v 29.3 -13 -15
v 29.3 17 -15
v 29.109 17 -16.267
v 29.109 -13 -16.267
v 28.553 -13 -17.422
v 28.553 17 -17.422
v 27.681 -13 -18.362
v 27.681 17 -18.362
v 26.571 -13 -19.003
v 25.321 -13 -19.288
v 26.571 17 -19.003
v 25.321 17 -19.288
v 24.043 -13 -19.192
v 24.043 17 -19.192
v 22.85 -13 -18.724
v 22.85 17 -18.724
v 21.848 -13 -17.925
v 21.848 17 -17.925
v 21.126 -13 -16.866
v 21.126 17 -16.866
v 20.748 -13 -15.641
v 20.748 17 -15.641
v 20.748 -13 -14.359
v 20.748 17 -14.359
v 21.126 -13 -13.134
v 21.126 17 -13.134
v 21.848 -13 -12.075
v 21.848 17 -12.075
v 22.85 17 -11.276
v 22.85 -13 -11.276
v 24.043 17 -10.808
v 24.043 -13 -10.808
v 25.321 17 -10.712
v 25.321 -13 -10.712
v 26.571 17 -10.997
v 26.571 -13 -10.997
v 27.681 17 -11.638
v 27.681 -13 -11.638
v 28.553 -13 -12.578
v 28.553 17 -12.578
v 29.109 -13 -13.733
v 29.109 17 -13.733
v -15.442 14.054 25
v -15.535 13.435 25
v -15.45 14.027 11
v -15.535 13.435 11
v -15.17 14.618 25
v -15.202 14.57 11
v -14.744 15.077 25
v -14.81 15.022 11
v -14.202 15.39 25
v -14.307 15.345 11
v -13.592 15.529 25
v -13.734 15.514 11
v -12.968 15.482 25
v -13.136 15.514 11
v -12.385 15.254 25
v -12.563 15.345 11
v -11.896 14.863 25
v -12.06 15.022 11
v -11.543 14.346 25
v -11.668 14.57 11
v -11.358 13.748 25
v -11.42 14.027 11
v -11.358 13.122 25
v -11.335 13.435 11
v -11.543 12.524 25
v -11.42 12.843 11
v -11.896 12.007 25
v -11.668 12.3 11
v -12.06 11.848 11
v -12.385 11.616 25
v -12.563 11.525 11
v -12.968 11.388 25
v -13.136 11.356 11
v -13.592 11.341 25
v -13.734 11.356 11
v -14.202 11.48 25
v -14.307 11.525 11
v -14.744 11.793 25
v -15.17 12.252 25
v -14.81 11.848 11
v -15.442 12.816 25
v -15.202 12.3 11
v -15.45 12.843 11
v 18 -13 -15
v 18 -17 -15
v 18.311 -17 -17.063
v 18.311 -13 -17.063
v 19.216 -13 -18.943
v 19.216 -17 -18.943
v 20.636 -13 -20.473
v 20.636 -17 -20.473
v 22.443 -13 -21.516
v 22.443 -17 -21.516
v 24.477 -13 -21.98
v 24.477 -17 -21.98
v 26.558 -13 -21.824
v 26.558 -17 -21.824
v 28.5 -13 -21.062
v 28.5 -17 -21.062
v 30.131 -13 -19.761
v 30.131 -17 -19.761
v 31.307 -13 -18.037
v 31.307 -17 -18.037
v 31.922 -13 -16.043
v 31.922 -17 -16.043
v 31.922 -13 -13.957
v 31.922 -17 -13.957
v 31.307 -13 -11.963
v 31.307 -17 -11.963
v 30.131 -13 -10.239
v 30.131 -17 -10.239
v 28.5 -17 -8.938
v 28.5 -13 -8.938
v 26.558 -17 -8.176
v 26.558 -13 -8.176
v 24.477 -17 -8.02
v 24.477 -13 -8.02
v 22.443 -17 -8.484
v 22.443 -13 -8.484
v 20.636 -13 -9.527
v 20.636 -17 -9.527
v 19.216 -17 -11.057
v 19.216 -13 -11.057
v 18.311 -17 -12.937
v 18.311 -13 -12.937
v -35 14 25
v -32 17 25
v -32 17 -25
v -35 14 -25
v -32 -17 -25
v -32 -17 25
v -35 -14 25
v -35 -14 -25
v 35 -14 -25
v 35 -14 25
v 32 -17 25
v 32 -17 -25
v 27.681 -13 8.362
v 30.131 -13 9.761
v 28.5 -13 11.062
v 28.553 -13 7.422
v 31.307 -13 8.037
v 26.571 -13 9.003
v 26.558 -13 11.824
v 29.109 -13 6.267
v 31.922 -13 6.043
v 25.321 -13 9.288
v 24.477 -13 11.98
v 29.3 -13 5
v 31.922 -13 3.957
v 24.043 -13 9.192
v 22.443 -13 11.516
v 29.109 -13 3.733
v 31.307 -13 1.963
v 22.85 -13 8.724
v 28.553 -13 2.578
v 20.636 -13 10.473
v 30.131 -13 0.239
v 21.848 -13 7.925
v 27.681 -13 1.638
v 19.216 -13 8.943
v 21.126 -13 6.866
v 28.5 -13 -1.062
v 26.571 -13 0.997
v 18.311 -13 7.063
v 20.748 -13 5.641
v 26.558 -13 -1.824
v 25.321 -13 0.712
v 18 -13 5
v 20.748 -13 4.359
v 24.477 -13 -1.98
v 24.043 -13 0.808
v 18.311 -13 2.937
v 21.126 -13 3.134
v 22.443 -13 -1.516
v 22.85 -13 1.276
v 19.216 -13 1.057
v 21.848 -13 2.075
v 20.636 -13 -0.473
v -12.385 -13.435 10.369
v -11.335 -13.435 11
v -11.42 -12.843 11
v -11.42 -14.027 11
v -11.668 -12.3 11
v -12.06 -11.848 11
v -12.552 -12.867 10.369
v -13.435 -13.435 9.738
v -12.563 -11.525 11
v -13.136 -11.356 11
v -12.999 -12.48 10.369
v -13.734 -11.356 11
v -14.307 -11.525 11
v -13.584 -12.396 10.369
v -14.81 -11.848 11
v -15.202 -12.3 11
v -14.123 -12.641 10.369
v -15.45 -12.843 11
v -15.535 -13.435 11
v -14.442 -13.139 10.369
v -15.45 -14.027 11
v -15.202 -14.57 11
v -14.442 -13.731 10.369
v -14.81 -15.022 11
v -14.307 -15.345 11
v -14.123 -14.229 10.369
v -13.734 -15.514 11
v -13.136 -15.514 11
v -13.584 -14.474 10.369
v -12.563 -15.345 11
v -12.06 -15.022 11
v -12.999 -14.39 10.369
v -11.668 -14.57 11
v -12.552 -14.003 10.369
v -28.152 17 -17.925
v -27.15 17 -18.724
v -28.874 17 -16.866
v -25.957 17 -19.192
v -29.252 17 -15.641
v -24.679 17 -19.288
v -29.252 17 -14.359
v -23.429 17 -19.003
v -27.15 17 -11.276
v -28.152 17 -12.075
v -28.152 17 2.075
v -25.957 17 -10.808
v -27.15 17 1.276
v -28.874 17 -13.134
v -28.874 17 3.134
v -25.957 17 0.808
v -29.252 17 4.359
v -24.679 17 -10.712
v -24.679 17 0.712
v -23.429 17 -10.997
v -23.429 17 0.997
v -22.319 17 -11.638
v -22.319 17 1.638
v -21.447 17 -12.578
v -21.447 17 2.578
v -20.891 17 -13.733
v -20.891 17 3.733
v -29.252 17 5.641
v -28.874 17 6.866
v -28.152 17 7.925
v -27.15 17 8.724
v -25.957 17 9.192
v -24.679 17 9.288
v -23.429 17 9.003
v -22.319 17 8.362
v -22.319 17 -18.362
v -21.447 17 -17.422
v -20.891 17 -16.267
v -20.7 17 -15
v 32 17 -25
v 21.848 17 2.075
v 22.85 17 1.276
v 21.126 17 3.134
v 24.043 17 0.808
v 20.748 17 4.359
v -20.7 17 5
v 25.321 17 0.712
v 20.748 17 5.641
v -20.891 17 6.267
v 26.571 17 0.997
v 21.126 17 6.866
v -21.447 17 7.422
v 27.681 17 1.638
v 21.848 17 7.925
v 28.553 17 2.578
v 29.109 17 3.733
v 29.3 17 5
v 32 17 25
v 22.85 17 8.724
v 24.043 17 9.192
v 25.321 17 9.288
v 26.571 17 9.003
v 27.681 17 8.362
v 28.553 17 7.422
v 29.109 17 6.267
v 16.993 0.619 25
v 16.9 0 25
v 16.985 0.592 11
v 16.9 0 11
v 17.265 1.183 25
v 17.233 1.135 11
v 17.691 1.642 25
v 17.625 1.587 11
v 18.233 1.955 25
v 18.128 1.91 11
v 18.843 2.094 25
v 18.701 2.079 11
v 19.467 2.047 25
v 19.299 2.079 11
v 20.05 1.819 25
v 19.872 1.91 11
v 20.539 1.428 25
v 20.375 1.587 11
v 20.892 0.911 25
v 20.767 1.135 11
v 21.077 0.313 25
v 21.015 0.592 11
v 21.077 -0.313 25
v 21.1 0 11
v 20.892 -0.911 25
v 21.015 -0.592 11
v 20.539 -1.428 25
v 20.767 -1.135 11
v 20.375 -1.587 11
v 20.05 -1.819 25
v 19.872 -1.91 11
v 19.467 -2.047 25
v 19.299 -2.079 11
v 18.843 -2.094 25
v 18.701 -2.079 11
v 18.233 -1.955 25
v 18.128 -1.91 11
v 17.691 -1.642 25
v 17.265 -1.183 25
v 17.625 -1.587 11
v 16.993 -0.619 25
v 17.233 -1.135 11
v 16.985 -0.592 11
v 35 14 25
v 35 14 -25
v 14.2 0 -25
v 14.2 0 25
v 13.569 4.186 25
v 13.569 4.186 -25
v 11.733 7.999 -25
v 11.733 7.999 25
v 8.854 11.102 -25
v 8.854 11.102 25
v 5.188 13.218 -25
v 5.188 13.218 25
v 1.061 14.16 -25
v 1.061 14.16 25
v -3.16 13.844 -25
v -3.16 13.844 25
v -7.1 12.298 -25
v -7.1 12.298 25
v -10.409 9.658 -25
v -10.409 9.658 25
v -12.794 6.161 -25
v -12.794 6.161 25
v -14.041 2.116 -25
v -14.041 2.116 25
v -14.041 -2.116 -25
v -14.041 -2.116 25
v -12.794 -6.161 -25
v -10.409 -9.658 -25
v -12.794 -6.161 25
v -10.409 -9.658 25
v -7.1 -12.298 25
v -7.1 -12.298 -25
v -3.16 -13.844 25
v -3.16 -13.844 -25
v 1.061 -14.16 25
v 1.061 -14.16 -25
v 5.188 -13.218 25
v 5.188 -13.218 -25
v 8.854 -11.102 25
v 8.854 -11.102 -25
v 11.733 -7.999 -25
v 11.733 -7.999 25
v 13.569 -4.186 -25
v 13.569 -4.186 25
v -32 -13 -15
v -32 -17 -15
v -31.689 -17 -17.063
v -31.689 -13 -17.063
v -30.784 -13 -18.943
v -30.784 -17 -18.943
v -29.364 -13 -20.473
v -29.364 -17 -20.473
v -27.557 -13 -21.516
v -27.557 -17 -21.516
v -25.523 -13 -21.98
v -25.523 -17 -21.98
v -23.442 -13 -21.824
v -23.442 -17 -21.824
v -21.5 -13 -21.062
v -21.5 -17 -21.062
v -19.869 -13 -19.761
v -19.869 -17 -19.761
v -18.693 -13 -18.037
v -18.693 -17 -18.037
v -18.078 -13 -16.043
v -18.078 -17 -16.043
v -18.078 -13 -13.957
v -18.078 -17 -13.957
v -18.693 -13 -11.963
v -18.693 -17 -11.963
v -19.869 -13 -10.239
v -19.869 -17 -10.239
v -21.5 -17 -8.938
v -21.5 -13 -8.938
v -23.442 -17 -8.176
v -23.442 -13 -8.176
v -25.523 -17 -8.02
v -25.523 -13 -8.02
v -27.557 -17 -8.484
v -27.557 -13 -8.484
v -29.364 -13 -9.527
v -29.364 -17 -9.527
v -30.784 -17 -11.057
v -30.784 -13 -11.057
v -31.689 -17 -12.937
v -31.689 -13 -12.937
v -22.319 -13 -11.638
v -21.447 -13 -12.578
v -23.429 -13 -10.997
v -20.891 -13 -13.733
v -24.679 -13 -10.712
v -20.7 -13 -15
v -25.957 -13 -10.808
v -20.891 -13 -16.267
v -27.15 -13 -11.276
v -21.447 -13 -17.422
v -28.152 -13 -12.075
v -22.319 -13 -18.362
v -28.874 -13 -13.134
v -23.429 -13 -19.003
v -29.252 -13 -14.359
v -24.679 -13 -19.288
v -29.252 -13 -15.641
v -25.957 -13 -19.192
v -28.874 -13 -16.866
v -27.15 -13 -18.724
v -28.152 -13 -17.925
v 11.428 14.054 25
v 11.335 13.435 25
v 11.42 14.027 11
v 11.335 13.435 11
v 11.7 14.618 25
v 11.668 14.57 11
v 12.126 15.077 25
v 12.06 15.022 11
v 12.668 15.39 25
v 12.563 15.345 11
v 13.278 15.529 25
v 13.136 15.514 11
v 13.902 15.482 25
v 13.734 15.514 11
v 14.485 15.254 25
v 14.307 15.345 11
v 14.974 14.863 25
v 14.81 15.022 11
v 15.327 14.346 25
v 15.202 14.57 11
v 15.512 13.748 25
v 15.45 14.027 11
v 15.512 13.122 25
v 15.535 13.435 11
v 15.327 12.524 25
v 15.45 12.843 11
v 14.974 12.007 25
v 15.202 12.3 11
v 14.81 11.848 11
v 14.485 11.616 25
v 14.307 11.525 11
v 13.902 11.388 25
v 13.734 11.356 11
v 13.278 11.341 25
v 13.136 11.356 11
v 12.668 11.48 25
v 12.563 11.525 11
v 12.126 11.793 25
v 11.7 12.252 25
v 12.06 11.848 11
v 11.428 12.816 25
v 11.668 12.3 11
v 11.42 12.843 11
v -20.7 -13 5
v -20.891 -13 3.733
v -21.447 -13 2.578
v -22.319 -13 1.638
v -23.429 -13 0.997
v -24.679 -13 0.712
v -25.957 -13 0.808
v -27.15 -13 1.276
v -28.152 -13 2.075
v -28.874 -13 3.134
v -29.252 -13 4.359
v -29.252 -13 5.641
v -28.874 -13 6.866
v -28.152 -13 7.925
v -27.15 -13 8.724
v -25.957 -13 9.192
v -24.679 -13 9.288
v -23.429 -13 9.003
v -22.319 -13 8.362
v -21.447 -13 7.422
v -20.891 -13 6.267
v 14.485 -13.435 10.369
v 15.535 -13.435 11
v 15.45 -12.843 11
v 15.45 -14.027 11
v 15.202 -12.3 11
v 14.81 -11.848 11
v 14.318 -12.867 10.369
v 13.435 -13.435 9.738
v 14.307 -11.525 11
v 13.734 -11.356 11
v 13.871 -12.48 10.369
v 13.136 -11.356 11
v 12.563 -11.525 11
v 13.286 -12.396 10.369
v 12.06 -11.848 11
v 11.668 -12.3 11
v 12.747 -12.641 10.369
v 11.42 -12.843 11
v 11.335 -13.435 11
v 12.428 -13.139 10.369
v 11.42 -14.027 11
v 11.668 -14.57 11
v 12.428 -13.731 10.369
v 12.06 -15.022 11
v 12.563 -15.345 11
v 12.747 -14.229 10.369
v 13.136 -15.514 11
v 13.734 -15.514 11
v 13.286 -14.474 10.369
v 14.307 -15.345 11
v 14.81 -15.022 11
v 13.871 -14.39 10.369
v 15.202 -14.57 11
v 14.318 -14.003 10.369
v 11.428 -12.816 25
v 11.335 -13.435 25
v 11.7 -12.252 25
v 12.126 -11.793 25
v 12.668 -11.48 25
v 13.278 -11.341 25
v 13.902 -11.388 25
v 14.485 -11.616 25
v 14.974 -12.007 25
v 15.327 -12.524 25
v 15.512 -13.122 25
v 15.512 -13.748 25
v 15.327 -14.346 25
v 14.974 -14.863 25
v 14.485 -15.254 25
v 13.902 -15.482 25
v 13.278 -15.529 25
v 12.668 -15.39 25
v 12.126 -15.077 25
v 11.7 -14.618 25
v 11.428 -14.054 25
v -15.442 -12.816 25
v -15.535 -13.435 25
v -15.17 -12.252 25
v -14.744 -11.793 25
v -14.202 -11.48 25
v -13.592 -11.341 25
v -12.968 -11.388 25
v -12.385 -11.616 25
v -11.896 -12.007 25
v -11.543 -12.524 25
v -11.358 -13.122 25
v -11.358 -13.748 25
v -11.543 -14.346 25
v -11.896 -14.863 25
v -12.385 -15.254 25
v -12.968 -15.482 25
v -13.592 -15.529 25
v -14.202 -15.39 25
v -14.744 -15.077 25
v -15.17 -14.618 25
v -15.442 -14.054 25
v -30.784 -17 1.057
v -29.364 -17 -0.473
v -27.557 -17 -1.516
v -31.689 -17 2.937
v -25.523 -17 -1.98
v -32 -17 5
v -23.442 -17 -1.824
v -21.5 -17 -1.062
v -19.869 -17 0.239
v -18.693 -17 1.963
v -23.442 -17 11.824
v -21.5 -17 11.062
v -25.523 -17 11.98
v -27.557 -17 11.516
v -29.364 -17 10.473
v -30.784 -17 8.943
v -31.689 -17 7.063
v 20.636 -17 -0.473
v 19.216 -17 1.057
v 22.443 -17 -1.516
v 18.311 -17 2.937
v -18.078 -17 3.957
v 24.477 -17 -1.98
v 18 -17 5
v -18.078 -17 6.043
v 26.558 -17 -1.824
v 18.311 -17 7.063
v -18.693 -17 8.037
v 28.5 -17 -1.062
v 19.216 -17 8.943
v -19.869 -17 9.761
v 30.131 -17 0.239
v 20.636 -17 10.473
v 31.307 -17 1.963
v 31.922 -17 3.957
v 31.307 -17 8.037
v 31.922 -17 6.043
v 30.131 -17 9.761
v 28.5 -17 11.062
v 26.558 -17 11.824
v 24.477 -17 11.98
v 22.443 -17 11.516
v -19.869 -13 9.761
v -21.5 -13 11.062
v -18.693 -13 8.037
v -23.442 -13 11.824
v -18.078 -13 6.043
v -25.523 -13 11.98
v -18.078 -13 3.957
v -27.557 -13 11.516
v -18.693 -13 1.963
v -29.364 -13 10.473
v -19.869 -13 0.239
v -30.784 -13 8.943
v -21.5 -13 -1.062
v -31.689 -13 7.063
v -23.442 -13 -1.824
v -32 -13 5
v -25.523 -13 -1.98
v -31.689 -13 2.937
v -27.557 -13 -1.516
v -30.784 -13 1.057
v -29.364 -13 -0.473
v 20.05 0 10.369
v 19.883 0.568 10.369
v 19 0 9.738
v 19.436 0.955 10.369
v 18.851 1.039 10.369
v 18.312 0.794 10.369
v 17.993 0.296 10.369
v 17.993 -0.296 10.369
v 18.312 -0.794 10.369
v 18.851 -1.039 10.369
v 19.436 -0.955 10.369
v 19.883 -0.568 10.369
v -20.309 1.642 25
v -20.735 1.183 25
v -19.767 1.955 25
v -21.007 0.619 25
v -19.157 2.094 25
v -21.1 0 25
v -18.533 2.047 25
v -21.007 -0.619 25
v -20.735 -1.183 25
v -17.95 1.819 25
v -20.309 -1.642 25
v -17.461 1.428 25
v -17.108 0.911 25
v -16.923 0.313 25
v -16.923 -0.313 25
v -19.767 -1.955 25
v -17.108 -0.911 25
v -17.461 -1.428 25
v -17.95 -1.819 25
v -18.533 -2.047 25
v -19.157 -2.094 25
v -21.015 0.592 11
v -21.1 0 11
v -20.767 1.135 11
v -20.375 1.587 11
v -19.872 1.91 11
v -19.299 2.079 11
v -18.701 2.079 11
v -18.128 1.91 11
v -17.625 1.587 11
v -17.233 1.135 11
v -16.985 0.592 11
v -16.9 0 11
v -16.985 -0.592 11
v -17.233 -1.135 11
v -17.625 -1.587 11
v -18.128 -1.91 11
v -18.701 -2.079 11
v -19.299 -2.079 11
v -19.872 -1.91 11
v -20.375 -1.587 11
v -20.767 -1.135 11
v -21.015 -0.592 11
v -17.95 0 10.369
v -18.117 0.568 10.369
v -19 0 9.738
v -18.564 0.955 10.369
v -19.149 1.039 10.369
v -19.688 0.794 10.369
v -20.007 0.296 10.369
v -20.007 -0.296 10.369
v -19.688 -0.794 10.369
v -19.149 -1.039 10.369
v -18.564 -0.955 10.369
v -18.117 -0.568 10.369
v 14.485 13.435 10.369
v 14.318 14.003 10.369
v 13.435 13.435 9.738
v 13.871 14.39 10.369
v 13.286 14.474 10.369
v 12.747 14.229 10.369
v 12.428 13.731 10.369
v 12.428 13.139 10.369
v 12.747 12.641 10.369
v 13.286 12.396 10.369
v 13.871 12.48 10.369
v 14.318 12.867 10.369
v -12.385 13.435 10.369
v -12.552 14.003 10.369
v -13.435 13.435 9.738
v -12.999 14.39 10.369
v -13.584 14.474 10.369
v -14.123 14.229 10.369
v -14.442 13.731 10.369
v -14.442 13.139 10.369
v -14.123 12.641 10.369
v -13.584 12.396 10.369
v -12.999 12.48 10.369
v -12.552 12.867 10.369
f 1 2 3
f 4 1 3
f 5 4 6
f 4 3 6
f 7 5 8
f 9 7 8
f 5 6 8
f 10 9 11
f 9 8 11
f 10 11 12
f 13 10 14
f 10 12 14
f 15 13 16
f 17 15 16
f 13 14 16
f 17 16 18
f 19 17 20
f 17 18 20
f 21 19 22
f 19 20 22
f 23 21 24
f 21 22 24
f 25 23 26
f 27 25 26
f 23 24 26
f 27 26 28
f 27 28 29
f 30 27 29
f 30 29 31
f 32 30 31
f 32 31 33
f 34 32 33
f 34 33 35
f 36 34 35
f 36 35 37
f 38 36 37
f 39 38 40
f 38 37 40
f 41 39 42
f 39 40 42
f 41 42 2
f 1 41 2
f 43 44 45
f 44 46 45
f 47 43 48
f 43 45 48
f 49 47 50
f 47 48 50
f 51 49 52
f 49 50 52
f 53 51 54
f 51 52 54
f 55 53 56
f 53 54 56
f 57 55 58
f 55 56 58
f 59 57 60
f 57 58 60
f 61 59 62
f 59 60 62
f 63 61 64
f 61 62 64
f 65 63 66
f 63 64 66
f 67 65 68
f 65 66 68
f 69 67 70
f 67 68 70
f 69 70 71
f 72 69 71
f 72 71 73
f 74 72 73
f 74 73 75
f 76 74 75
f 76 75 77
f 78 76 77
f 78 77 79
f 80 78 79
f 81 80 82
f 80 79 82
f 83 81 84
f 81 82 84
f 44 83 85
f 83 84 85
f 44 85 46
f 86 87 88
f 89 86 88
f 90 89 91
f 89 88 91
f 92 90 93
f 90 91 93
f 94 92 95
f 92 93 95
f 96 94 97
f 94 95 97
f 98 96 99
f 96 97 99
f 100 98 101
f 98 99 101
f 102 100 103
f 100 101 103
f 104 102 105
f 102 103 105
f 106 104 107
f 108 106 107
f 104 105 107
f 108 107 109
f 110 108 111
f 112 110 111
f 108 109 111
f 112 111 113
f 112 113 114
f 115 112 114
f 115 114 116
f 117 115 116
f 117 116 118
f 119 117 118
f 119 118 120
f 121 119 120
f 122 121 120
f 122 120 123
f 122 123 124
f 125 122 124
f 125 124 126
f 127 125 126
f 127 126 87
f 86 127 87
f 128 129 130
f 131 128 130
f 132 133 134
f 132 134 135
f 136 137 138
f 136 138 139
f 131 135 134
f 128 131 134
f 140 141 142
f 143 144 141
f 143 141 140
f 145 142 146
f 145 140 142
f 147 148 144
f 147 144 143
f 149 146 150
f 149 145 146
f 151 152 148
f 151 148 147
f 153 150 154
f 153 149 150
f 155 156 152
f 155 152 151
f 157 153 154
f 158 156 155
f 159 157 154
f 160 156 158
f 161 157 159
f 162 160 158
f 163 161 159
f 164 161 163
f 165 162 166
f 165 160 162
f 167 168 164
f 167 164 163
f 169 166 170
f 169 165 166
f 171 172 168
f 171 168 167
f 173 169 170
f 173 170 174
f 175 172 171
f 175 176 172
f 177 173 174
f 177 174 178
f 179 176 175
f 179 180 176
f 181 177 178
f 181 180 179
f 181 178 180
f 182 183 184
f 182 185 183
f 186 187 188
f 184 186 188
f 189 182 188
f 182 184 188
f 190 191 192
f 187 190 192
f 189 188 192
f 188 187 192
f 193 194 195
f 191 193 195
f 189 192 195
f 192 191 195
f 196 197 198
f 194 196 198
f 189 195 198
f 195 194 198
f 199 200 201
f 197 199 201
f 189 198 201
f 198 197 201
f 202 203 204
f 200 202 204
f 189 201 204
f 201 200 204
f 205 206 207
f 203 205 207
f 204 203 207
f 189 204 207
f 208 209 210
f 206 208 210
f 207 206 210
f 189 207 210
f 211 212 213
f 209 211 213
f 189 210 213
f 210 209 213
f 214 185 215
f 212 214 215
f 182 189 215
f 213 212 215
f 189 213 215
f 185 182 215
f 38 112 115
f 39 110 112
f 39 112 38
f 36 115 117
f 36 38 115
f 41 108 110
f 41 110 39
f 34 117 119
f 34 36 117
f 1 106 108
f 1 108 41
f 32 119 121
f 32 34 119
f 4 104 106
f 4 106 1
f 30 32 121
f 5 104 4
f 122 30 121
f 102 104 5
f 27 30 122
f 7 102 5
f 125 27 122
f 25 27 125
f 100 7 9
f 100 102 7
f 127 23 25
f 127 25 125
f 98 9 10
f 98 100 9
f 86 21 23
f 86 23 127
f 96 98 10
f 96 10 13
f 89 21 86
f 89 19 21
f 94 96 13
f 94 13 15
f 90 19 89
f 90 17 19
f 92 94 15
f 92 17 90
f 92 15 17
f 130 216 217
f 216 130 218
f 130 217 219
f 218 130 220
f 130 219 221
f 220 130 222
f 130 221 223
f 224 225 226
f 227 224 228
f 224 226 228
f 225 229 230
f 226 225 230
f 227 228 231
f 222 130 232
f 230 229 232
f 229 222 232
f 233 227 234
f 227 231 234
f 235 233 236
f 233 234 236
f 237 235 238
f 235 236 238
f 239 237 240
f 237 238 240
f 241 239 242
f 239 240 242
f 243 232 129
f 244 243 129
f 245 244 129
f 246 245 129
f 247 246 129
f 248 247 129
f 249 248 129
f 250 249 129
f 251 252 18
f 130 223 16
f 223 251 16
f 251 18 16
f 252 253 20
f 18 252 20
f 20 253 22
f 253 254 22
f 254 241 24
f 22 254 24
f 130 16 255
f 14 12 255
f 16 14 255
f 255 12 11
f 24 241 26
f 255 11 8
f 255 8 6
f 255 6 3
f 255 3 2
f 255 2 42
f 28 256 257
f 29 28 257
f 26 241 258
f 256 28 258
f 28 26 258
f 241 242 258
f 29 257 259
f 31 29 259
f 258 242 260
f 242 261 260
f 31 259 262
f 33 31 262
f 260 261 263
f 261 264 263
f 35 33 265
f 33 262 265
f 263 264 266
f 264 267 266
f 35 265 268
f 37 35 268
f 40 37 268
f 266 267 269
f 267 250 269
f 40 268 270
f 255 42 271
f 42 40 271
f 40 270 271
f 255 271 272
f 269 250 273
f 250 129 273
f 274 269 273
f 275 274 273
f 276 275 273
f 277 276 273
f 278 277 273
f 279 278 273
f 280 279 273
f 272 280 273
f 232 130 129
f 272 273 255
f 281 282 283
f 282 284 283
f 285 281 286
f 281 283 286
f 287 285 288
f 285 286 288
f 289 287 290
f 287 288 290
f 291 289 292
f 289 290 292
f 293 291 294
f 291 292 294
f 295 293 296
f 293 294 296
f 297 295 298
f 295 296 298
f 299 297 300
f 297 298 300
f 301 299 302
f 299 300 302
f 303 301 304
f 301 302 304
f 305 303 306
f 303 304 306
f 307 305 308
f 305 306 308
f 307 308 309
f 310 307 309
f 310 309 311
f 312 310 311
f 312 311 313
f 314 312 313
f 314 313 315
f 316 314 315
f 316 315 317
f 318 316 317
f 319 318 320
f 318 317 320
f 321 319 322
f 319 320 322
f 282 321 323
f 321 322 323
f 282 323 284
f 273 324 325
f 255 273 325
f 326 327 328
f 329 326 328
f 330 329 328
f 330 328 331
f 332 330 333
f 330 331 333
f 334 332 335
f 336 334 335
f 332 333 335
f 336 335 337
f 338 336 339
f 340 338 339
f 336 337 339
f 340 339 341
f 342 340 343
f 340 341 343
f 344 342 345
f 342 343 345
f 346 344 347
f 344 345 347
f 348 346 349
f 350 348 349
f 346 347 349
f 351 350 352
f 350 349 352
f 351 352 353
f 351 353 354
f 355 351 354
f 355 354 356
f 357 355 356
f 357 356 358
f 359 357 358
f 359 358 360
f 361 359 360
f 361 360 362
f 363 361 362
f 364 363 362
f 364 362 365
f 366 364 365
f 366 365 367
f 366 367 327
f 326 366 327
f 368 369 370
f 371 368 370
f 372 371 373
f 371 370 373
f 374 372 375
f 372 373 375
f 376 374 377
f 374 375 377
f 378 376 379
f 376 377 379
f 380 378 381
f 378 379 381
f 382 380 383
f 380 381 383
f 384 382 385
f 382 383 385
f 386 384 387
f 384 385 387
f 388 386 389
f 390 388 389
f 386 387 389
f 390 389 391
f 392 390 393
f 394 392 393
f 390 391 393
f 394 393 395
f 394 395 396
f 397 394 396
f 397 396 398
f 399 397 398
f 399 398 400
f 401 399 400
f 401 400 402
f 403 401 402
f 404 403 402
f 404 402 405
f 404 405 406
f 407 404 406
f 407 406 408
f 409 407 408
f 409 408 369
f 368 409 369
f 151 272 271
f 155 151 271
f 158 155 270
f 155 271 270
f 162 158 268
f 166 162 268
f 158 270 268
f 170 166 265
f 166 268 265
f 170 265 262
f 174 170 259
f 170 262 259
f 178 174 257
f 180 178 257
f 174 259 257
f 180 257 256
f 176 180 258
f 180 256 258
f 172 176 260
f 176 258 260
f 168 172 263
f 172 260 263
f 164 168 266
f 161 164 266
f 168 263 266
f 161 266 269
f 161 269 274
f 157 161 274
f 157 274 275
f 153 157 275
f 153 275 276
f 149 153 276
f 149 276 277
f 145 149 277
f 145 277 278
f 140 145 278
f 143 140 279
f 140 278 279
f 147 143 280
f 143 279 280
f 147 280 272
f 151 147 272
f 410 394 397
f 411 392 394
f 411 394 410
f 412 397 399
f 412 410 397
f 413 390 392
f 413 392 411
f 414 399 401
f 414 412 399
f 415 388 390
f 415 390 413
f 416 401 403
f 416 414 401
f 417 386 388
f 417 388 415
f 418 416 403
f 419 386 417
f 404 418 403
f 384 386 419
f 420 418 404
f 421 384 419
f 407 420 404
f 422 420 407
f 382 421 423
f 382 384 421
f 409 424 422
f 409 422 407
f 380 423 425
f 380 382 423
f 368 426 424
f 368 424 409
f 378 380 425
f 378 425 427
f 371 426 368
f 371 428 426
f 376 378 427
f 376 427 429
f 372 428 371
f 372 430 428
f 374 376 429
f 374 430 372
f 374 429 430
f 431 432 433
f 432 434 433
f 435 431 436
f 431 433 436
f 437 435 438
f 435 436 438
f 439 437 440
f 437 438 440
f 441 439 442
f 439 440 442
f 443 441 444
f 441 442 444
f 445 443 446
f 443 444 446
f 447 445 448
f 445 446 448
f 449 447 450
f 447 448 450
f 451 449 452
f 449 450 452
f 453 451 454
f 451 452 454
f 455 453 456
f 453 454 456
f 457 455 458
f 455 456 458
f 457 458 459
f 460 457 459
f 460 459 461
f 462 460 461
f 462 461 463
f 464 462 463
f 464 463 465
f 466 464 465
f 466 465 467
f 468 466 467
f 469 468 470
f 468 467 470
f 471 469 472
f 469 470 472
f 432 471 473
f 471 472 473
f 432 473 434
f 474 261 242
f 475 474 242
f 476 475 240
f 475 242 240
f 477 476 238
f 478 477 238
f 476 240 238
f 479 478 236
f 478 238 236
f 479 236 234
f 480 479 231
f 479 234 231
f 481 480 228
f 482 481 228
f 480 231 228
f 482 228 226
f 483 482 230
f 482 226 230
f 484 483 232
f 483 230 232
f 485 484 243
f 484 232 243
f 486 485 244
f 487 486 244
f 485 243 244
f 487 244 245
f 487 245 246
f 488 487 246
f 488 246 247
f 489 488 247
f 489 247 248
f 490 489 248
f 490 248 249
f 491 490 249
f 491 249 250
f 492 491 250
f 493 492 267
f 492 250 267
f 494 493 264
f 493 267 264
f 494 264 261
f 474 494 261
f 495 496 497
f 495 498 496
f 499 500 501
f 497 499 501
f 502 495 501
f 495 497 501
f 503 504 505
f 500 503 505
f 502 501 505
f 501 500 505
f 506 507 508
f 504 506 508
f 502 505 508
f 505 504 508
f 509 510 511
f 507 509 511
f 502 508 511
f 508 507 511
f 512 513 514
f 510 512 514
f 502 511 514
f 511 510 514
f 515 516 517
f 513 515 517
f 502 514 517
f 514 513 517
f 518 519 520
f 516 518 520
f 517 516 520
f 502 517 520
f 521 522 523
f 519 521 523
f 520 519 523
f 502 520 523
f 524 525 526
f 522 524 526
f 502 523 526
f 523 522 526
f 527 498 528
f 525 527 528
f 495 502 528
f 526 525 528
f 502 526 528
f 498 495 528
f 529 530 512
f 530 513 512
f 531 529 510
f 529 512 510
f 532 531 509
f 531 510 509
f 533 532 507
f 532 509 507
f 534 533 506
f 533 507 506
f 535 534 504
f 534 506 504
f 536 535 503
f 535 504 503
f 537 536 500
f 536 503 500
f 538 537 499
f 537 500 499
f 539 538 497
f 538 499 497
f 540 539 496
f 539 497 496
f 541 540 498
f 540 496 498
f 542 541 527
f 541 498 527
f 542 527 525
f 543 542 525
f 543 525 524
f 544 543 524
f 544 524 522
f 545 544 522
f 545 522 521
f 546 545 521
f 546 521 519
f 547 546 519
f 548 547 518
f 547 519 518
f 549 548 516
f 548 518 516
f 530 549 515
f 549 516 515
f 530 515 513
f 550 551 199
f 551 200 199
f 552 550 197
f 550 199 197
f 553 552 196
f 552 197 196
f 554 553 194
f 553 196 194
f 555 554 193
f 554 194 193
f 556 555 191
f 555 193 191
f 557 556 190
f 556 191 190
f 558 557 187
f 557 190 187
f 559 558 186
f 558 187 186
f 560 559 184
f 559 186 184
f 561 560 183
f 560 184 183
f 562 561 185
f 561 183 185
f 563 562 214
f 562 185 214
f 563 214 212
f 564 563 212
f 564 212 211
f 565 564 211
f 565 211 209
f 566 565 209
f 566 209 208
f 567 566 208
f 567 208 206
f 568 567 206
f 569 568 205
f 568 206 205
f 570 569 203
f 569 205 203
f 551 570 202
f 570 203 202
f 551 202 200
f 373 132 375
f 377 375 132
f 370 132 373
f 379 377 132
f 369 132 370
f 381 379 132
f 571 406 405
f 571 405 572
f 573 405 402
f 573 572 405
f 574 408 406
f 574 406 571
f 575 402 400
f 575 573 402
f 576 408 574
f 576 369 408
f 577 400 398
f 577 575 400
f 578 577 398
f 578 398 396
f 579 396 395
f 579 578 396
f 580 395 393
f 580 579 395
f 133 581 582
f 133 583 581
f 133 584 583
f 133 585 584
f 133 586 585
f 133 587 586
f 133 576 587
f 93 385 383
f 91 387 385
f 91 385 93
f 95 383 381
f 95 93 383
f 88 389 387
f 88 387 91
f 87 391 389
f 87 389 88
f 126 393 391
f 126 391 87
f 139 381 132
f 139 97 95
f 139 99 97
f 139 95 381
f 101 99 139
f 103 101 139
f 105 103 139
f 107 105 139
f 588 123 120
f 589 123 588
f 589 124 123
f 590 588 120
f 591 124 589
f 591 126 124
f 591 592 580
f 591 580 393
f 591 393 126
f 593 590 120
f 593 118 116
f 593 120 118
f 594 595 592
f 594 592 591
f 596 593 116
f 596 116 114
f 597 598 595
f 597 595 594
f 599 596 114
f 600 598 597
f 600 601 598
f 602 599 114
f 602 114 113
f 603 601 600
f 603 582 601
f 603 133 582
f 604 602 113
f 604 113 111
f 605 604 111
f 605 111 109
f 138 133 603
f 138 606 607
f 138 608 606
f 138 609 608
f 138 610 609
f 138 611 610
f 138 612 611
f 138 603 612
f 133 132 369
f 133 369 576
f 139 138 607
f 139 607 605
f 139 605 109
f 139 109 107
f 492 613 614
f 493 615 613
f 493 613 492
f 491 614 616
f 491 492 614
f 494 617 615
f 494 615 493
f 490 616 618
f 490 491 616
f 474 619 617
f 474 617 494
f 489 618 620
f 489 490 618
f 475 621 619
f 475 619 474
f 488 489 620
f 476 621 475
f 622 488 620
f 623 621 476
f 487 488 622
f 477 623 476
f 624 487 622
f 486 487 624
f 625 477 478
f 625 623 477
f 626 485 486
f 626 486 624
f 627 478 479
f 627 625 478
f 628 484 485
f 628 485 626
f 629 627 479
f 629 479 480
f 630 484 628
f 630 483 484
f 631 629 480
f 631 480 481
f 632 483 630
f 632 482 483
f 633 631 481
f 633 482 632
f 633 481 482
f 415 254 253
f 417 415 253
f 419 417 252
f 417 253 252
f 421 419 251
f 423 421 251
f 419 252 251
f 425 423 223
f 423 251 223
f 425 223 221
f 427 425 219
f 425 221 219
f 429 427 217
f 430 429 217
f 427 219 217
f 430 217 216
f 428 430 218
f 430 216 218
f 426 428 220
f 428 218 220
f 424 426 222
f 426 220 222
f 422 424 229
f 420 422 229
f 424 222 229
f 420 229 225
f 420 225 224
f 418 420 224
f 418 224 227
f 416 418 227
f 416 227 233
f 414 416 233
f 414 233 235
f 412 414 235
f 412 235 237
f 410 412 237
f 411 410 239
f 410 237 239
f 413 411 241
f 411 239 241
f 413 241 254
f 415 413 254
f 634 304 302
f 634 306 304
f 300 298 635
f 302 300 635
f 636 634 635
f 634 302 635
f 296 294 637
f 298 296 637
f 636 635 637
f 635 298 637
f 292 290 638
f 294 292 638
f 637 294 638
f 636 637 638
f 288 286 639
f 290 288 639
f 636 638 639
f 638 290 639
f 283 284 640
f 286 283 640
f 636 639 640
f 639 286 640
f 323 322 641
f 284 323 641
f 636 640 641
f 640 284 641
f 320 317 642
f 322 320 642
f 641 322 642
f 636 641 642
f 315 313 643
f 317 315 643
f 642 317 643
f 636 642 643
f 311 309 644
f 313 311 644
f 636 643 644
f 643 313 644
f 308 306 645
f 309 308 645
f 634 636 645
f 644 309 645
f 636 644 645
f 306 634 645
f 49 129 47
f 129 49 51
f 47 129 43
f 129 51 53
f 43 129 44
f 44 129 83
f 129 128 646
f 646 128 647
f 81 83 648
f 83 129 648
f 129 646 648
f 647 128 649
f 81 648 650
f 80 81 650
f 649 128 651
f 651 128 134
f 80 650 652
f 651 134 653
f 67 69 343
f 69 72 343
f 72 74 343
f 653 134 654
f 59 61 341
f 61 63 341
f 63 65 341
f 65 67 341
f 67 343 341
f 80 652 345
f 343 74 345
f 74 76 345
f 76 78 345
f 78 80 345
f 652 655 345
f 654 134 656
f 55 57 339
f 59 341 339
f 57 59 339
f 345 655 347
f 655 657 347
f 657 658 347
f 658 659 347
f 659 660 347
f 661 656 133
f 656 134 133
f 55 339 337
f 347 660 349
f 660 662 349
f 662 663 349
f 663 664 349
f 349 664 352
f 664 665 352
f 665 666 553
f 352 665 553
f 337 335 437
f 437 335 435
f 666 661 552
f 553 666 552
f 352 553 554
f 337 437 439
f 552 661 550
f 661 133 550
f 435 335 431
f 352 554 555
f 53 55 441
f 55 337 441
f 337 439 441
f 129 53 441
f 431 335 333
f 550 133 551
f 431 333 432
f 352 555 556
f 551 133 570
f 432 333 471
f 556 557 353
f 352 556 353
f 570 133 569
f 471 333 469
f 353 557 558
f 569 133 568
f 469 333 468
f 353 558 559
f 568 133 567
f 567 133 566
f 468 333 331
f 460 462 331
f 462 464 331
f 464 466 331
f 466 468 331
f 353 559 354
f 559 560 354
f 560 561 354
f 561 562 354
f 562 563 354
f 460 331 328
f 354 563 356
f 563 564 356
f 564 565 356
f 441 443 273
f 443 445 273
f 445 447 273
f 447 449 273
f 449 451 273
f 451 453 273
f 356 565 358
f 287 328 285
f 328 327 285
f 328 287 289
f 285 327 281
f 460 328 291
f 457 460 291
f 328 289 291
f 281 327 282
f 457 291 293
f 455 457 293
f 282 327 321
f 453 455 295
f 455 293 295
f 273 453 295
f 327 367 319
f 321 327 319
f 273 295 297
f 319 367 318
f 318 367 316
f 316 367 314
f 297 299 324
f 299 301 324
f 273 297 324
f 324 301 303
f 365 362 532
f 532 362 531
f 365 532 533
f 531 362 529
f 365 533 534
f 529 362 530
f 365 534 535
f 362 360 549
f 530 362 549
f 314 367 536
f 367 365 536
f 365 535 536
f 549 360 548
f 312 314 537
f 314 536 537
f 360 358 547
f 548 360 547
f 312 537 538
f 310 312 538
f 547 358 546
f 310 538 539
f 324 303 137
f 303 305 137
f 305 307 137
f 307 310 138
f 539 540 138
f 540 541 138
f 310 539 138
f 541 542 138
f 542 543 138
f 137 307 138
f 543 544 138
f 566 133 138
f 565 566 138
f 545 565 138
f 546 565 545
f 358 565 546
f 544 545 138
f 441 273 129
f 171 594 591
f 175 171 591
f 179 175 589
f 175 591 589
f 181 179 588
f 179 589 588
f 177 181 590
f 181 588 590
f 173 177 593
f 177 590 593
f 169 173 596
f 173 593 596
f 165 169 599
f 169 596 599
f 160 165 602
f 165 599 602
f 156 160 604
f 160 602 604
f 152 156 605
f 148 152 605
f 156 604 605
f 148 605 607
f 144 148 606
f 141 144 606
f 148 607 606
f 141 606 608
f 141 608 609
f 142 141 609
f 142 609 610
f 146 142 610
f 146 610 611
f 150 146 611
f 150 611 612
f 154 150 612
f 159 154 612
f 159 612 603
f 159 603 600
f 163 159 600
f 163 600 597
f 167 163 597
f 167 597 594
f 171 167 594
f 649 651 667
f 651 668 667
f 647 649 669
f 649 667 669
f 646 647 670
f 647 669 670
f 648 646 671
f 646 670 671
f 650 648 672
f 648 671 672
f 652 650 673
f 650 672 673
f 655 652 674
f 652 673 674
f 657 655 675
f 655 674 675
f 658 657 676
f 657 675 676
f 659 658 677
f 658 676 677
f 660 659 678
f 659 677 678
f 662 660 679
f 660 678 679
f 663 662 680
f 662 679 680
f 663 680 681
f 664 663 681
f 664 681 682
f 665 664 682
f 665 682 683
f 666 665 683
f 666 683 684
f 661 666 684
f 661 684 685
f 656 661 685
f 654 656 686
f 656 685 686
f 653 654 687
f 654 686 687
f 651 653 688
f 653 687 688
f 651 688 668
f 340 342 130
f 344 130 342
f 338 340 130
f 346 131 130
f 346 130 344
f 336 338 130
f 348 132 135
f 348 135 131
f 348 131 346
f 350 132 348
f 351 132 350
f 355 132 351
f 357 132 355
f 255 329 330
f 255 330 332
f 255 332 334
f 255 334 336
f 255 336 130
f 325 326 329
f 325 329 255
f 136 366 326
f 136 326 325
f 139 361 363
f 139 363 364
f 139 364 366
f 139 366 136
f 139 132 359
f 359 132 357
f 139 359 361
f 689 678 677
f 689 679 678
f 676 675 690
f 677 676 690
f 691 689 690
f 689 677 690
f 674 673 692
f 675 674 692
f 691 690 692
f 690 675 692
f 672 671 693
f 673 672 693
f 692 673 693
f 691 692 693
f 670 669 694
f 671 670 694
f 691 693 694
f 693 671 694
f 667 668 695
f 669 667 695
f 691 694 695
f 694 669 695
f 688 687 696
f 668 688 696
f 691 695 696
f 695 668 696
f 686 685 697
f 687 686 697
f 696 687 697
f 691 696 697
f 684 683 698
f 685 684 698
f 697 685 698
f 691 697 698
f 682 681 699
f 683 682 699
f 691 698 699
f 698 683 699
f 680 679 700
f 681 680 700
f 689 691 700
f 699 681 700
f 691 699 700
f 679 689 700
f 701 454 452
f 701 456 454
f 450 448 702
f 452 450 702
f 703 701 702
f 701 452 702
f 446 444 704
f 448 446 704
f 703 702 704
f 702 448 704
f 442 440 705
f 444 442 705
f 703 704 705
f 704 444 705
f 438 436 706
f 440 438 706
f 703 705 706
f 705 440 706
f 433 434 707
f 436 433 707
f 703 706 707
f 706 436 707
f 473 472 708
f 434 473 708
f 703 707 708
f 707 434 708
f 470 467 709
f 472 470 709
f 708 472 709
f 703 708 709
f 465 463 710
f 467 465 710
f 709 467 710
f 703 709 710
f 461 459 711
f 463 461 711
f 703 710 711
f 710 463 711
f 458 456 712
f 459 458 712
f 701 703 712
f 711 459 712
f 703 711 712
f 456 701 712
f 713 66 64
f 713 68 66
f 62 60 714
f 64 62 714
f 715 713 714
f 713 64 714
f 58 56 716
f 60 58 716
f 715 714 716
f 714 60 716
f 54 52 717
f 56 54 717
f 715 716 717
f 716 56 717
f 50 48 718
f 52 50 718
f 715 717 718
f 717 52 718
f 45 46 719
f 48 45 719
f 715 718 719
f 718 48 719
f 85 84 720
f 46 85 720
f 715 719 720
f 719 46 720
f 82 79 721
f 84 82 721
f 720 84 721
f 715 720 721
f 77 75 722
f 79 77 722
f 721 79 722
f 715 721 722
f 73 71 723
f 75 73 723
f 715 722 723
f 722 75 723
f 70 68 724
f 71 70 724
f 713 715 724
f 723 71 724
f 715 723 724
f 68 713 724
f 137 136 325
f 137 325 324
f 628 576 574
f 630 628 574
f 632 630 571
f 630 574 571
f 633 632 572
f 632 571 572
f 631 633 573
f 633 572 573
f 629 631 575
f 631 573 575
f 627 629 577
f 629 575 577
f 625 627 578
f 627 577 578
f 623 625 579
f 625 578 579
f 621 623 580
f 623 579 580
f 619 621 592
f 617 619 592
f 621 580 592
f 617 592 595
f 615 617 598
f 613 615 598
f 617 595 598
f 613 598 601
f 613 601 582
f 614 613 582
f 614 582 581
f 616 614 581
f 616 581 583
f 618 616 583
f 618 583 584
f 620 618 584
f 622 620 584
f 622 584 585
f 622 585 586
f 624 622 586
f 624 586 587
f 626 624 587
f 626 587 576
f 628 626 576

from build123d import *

# Parameters (mm, degrees)
SKETCH1_W                               = 70
SKETCH1_H                               = 50
BOSS_EXTRUDE1_DEPTH                     = 48
CBORE_FOR_M8_HEX_HEAD_BOLT1_D           = 8.6
CBORE_FOR_M8_HEX_HEAD_BOLT1_CBORE_D     = 14
CBORE_FOR_M8_HEX_HEAD_BOLT1_CBORE_DEPTH = 11
M25_CLEARANCE_HOLE1_D                   = 28.4
F_4_2_4_2_DIAMETER_HOLE1_D              = 4.2
F_4_2_4_2_DIAMETER_HOLE1_DEPTH          = 14
F_4_2_4_2_DIAMETER_HOLE1_TIP            = 1.2618073
SKETCH8_W                               = 70
SKETCH8_H                               = 7
CUT_EXTRUDE1_DEPTH                      = 66.582009728
CHAMFER1_SIZE                           = 3


with BuildPart() as part:
    # Sketch1 → Boss-Extrude1 (new body)
    with BuildSketch(Plane.XZ.offset(24)):
        Rectangle(SKETCH1_W, SKETCH1_H)
    extrude(amount=-BOSS_EXTRUDE1_DEPTH)

    # CBORE for M8 Hex Head Bolt1 (through all)
    with Locations(Plane(origin=(0, -24, 0), x_dir=(-1, 0, 0), z_dir=(0, -1, 0))):
        with Locations((25, -5), (-25, -5), (-25, 15), (25, 15)):
            CounterBoreHole(CBORE_FOR_M8_HEX_HEAD_BOLT1_D / 2, CBORE_FOR_M8_HEX_HEAD_BOLT1_CBORE_D / 2, CBORE_FOR_M8_HEX_HEAD_BOLT1_CBORE_DEPTH)

    # M25 Clearance Hole1 (through all)
    with Locations(Plane(origin=(0, 0, -25), x_dir=(-1, 0, 0), z_dir=(0, 0, -1))):
        with Locations((0, 0)):
            Hole(M25_CLEARANCE_HOLE1_D / 2)

    # Ø4.2 (4.2) Diameter Hole1
    with Locations(Plane.XY.offset(25)):
        with Locations((13.435028843, -13.435028843), (13.435028843, 13.435028843), (19, 0), (-13.435028843, 13.435028843), (-13.435028843, -13.435028843), (-19, 0)):
            Hole(F_4_2_4_2_DIAMETER_HOLE1_D / 2, depth=F_4_2_4_2_DIAMETER_HOLE1_DEPTH)
            with Locations((0, 0, -(F_4_2_4_2_DIAMETER_HOLE1_DEPTH + F_4_2_4_2_DIAMETER_HOLE1_TIP / 2))):  # 118° drill point
                Cone(0, F_4_2_4_2_DIAMETER_HOLE1_D / 2, F_4_2_4_2_DIAMETER_HOLE1_TIP, mode=Mode.SUBTRACT)

    # Sketch8 → Cut-Extrude1 (cut, through all)
    with BuildSketch(Plane.XY.offset(25)):
        with Locations((0, 20.5)):
            Rectangle(SKETCH8_W, SKETCH8_H)
        with Locations((0, -20.5)):
            Rectangle(SKETCH8_W, SKETCH8_H)
    extrude(amount=-CUT_EXTRUDE1_DEPTH, mode=Mode.SUBTRACT)

    # Chamfer1
    chamfer1_edges = [part.edges().sort_by_distance(p)[0] for p in [
        (-35, -17, 0),
        (35, -17, 0),
        (35, 17, 0),
        (-35, 17, 0),
    ]]
    chamfer(chamfer1_edges, length=CHAMFER1_SIZE - 0.0001)  # a hair under: the kernel refuses the full size


solid = part.part
